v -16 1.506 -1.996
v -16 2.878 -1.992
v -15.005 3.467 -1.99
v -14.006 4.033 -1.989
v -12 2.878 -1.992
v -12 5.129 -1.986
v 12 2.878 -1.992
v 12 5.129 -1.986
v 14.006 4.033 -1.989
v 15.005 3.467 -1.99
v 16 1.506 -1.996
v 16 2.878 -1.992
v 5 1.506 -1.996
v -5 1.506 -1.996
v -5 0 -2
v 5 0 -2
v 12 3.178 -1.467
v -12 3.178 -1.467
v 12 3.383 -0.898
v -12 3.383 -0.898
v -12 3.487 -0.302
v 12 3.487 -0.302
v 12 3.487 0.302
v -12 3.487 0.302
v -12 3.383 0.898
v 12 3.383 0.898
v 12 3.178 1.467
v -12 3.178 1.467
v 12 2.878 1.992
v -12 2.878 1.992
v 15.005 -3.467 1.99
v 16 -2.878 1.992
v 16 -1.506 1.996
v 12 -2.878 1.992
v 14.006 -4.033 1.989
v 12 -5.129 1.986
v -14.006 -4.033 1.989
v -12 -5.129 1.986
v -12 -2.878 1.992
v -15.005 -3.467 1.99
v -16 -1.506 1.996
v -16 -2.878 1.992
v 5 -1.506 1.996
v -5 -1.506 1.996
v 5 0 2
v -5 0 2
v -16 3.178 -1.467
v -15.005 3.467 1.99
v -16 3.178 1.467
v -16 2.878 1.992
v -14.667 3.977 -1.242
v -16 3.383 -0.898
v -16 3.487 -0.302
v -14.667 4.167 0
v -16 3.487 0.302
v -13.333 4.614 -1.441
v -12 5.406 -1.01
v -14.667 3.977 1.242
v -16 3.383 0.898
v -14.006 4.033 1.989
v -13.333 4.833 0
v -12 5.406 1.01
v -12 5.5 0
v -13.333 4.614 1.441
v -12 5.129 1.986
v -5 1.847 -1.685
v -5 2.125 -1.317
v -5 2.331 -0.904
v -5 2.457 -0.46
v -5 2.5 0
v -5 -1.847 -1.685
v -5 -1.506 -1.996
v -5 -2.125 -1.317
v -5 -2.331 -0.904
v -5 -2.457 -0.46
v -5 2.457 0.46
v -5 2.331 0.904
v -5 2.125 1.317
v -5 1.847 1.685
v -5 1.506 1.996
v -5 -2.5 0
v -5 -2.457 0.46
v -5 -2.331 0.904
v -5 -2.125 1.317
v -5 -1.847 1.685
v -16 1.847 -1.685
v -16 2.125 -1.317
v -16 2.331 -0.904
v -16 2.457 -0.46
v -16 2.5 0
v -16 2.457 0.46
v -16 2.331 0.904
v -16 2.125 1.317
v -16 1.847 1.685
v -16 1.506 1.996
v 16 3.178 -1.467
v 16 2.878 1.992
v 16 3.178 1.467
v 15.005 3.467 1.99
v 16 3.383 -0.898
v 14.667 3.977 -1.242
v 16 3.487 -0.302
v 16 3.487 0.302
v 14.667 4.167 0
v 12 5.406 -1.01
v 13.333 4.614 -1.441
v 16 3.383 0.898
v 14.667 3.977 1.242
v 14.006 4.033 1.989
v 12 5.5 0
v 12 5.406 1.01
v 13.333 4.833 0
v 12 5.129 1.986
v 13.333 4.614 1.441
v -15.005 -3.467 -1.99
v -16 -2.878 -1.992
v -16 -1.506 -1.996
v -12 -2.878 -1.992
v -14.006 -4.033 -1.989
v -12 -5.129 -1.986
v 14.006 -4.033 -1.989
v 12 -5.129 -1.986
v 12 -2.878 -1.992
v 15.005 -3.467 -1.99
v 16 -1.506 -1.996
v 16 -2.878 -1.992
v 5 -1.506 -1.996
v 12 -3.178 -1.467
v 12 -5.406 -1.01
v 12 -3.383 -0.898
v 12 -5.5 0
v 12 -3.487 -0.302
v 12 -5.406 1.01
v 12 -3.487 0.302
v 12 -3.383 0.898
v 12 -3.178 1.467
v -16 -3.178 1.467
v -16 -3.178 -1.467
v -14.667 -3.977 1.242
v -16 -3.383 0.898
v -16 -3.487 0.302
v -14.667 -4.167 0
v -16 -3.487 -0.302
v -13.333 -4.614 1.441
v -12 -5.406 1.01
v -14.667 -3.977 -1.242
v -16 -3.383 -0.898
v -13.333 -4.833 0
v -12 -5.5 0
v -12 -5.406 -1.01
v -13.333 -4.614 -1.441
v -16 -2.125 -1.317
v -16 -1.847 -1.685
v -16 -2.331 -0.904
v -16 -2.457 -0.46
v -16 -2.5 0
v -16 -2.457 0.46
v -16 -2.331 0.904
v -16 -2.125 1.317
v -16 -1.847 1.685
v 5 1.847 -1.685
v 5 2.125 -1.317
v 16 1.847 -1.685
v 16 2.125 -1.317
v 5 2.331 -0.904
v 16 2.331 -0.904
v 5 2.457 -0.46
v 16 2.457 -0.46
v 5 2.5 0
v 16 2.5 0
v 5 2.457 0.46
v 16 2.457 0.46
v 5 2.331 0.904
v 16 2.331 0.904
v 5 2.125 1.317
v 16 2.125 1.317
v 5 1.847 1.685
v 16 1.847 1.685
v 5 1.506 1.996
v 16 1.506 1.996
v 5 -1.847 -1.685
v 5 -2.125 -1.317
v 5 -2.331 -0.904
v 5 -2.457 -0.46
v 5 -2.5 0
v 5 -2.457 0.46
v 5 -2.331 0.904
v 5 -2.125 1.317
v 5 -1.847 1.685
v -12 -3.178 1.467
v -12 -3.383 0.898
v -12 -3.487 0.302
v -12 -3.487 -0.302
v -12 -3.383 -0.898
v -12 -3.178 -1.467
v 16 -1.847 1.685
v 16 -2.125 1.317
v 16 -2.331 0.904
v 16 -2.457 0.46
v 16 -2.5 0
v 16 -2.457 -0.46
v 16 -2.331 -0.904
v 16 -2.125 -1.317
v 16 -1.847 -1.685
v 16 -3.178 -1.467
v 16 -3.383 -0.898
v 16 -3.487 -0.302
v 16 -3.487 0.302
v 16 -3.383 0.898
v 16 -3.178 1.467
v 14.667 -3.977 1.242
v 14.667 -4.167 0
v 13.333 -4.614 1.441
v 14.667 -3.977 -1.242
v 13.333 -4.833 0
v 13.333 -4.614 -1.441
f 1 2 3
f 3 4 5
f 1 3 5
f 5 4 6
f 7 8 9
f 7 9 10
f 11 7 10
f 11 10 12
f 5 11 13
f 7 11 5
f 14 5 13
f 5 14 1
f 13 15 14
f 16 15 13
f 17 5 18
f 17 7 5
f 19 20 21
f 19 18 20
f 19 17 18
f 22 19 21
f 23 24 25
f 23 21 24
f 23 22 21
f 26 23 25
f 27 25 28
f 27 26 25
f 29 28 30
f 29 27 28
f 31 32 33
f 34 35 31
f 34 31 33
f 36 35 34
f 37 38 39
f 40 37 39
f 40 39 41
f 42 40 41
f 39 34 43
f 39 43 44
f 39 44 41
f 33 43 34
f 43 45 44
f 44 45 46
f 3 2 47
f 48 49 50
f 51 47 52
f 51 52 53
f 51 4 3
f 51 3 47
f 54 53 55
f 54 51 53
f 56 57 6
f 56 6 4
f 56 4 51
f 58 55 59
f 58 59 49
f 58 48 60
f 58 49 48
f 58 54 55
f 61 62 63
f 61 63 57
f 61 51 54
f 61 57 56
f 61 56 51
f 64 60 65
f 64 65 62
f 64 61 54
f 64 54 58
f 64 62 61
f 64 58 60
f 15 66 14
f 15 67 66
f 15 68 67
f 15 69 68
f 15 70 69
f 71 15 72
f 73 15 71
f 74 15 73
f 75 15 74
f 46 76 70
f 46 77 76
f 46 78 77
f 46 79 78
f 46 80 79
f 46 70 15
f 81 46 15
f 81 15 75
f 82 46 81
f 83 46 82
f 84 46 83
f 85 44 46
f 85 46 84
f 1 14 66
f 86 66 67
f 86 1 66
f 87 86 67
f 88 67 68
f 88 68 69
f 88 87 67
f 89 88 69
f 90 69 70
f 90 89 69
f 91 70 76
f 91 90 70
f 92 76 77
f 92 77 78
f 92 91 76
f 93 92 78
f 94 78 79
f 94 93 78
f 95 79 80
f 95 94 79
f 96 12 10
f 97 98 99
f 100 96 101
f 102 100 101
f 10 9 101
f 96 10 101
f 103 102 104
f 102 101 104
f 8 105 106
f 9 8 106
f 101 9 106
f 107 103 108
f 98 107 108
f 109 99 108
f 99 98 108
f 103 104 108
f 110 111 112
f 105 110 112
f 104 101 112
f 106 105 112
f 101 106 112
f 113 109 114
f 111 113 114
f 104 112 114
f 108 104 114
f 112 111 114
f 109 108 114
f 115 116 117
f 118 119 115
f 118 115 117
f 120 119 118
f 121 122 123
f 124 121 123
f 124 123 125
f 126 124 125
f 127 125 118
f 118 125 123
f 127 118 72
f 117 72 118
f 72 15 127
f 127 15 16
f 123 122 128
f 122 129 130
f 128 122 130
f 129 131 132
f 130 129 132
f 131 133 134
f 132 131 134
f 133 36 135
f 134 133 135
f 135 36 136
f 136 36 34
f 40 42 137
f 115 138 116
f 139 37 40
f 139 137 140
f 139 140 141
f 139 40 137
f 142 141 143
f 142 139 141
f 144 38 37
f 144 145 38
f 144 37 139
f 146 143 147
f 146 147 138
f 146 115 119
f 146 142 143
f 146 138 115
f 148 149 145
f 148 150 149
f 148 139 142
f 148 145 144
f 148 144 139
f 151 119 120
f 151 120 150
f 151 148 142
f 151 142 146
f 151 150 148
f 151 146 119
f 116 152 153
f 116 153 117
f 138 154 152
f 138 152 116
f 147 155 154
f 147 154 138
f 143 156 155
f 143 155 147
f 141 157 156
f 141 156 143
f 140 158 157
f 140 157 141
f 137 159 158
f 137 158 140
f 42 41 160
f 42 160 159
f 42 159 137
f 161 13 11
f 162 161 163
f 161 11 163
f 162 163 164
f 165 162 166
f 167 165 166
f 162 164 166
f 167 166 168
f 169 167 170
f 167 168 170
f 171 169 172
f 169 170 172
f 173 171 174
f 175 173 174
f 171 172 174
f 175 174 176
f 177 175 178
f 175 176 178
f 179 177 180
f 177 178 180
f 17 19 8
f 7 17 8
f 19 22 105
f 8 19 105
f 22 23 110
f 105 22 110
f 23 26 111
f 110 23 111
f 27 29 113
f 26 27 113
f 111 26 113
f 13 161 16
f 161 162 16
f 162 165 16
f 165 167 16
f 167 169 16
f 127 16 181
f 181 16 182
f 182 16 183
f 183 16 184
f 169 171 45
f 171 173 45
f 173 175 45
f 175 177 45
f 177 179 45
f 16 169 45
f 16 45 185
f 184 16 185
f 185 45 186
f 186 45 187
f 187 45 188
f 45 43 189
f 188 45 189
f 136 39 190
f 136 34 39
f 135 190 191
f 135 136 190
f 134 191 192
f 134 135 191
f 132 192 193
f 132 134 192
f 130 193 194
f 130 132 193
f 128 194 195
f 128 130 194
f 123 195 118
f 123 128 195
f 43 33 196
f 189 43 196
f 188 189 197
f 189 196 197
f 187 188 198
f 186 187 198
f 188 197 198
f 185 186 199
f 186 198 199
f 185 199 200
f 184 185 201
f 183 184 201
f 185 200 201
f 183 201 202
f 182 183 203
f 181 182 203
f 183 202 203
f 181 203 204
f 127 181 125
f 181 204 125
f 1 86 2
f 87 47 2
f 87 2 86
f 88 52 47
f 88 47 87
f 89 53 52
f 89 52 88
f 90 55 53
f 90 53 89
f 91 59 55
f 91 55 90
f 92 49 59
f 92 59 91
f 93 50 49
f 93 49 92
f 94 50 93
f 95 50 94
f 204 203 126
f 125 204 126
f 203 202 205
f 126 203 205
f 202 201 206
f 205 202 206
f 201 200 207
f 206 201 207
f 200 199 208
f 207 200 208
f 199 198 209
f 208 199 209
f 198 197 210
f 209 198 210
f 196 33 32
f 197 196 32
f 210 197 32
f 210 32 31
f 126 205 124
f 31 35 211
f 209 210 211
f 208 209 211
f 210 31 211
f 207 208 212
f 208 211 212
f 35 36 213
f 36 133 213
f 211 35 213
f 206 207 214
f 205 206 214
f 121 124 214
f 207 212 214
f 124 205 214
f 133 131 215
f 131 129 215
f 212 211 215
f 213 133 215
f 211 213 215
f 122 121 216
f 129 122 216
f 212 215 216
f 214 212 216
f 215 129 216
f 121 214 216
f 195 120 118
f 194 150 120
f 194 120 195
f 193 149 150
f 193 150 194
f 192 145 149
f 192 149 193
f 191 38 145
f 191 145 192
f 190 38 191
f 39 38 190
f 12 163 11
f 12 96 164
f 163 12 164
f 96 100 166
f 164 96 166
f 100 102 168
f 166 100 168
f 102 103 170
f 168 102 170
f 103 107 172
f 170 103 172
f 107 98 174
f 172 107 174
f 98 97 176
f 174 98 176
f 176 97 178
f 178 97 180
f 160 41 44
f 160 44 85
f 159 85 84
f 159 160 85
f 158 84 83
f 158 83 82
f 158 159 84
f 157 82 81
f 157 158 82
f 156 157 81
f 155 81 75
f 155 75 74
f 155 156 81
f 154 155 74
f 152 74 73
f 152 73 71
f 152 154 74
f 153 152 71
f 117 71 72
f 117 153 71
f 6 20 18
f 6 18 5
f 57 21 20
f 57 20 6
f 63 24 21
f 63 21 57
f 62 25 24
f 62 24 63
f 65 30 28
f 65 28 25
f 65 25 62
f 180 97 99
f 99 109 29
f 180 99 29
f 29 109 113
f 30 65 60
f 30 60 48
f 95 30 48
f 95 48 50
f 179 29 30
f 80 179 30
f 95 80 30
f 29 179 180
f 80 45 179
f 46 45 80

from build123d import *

# Parameters (mm, degrees)
F2_W     = 21
F2_H     = 15
F3_DEPTH = 10.5
F3_TAPER = -0.16


with BuildPart() as f1:
    # F0 (on Top) → F1 (revolve)
    with BuildSketch(Plane.XY):
        Polygon((5, 3.5), (0, 3.5), (0, 0), (5, 0), (5, 2.5), align=None)
        Polygon((12, 3.5), (5, 3.5), (5, 2.5), (16, 2.5), (16, 3.5), align=None)
        Polygon((12, 5.5), (12, 3.5), (16, 3.5), align=None)
    revolve(axis=Axis((2.5, 0, 0), (1, 0, 0)))

    # F2 (on Front) → F3 (cut, symmetric)
    with BuildSketch(Plane.XZ):
        with Locations((10.5, 9.5)):
            Rectangle(F2_W, F2_H)
        with Locations((10.5, -9.5)):
            Rectangle(F2_W, F2_H)
    extrude(amount=F3_DEPTH, both=True, taper=F3_TAPER, mode=Mode.SUBTRACT)

    # F4: F1 across plane


with BuildPart() as f1_1:
    add(f1.part)
    add(f1.part.mirror(Plane.YZ))


solid = f1_1.part
